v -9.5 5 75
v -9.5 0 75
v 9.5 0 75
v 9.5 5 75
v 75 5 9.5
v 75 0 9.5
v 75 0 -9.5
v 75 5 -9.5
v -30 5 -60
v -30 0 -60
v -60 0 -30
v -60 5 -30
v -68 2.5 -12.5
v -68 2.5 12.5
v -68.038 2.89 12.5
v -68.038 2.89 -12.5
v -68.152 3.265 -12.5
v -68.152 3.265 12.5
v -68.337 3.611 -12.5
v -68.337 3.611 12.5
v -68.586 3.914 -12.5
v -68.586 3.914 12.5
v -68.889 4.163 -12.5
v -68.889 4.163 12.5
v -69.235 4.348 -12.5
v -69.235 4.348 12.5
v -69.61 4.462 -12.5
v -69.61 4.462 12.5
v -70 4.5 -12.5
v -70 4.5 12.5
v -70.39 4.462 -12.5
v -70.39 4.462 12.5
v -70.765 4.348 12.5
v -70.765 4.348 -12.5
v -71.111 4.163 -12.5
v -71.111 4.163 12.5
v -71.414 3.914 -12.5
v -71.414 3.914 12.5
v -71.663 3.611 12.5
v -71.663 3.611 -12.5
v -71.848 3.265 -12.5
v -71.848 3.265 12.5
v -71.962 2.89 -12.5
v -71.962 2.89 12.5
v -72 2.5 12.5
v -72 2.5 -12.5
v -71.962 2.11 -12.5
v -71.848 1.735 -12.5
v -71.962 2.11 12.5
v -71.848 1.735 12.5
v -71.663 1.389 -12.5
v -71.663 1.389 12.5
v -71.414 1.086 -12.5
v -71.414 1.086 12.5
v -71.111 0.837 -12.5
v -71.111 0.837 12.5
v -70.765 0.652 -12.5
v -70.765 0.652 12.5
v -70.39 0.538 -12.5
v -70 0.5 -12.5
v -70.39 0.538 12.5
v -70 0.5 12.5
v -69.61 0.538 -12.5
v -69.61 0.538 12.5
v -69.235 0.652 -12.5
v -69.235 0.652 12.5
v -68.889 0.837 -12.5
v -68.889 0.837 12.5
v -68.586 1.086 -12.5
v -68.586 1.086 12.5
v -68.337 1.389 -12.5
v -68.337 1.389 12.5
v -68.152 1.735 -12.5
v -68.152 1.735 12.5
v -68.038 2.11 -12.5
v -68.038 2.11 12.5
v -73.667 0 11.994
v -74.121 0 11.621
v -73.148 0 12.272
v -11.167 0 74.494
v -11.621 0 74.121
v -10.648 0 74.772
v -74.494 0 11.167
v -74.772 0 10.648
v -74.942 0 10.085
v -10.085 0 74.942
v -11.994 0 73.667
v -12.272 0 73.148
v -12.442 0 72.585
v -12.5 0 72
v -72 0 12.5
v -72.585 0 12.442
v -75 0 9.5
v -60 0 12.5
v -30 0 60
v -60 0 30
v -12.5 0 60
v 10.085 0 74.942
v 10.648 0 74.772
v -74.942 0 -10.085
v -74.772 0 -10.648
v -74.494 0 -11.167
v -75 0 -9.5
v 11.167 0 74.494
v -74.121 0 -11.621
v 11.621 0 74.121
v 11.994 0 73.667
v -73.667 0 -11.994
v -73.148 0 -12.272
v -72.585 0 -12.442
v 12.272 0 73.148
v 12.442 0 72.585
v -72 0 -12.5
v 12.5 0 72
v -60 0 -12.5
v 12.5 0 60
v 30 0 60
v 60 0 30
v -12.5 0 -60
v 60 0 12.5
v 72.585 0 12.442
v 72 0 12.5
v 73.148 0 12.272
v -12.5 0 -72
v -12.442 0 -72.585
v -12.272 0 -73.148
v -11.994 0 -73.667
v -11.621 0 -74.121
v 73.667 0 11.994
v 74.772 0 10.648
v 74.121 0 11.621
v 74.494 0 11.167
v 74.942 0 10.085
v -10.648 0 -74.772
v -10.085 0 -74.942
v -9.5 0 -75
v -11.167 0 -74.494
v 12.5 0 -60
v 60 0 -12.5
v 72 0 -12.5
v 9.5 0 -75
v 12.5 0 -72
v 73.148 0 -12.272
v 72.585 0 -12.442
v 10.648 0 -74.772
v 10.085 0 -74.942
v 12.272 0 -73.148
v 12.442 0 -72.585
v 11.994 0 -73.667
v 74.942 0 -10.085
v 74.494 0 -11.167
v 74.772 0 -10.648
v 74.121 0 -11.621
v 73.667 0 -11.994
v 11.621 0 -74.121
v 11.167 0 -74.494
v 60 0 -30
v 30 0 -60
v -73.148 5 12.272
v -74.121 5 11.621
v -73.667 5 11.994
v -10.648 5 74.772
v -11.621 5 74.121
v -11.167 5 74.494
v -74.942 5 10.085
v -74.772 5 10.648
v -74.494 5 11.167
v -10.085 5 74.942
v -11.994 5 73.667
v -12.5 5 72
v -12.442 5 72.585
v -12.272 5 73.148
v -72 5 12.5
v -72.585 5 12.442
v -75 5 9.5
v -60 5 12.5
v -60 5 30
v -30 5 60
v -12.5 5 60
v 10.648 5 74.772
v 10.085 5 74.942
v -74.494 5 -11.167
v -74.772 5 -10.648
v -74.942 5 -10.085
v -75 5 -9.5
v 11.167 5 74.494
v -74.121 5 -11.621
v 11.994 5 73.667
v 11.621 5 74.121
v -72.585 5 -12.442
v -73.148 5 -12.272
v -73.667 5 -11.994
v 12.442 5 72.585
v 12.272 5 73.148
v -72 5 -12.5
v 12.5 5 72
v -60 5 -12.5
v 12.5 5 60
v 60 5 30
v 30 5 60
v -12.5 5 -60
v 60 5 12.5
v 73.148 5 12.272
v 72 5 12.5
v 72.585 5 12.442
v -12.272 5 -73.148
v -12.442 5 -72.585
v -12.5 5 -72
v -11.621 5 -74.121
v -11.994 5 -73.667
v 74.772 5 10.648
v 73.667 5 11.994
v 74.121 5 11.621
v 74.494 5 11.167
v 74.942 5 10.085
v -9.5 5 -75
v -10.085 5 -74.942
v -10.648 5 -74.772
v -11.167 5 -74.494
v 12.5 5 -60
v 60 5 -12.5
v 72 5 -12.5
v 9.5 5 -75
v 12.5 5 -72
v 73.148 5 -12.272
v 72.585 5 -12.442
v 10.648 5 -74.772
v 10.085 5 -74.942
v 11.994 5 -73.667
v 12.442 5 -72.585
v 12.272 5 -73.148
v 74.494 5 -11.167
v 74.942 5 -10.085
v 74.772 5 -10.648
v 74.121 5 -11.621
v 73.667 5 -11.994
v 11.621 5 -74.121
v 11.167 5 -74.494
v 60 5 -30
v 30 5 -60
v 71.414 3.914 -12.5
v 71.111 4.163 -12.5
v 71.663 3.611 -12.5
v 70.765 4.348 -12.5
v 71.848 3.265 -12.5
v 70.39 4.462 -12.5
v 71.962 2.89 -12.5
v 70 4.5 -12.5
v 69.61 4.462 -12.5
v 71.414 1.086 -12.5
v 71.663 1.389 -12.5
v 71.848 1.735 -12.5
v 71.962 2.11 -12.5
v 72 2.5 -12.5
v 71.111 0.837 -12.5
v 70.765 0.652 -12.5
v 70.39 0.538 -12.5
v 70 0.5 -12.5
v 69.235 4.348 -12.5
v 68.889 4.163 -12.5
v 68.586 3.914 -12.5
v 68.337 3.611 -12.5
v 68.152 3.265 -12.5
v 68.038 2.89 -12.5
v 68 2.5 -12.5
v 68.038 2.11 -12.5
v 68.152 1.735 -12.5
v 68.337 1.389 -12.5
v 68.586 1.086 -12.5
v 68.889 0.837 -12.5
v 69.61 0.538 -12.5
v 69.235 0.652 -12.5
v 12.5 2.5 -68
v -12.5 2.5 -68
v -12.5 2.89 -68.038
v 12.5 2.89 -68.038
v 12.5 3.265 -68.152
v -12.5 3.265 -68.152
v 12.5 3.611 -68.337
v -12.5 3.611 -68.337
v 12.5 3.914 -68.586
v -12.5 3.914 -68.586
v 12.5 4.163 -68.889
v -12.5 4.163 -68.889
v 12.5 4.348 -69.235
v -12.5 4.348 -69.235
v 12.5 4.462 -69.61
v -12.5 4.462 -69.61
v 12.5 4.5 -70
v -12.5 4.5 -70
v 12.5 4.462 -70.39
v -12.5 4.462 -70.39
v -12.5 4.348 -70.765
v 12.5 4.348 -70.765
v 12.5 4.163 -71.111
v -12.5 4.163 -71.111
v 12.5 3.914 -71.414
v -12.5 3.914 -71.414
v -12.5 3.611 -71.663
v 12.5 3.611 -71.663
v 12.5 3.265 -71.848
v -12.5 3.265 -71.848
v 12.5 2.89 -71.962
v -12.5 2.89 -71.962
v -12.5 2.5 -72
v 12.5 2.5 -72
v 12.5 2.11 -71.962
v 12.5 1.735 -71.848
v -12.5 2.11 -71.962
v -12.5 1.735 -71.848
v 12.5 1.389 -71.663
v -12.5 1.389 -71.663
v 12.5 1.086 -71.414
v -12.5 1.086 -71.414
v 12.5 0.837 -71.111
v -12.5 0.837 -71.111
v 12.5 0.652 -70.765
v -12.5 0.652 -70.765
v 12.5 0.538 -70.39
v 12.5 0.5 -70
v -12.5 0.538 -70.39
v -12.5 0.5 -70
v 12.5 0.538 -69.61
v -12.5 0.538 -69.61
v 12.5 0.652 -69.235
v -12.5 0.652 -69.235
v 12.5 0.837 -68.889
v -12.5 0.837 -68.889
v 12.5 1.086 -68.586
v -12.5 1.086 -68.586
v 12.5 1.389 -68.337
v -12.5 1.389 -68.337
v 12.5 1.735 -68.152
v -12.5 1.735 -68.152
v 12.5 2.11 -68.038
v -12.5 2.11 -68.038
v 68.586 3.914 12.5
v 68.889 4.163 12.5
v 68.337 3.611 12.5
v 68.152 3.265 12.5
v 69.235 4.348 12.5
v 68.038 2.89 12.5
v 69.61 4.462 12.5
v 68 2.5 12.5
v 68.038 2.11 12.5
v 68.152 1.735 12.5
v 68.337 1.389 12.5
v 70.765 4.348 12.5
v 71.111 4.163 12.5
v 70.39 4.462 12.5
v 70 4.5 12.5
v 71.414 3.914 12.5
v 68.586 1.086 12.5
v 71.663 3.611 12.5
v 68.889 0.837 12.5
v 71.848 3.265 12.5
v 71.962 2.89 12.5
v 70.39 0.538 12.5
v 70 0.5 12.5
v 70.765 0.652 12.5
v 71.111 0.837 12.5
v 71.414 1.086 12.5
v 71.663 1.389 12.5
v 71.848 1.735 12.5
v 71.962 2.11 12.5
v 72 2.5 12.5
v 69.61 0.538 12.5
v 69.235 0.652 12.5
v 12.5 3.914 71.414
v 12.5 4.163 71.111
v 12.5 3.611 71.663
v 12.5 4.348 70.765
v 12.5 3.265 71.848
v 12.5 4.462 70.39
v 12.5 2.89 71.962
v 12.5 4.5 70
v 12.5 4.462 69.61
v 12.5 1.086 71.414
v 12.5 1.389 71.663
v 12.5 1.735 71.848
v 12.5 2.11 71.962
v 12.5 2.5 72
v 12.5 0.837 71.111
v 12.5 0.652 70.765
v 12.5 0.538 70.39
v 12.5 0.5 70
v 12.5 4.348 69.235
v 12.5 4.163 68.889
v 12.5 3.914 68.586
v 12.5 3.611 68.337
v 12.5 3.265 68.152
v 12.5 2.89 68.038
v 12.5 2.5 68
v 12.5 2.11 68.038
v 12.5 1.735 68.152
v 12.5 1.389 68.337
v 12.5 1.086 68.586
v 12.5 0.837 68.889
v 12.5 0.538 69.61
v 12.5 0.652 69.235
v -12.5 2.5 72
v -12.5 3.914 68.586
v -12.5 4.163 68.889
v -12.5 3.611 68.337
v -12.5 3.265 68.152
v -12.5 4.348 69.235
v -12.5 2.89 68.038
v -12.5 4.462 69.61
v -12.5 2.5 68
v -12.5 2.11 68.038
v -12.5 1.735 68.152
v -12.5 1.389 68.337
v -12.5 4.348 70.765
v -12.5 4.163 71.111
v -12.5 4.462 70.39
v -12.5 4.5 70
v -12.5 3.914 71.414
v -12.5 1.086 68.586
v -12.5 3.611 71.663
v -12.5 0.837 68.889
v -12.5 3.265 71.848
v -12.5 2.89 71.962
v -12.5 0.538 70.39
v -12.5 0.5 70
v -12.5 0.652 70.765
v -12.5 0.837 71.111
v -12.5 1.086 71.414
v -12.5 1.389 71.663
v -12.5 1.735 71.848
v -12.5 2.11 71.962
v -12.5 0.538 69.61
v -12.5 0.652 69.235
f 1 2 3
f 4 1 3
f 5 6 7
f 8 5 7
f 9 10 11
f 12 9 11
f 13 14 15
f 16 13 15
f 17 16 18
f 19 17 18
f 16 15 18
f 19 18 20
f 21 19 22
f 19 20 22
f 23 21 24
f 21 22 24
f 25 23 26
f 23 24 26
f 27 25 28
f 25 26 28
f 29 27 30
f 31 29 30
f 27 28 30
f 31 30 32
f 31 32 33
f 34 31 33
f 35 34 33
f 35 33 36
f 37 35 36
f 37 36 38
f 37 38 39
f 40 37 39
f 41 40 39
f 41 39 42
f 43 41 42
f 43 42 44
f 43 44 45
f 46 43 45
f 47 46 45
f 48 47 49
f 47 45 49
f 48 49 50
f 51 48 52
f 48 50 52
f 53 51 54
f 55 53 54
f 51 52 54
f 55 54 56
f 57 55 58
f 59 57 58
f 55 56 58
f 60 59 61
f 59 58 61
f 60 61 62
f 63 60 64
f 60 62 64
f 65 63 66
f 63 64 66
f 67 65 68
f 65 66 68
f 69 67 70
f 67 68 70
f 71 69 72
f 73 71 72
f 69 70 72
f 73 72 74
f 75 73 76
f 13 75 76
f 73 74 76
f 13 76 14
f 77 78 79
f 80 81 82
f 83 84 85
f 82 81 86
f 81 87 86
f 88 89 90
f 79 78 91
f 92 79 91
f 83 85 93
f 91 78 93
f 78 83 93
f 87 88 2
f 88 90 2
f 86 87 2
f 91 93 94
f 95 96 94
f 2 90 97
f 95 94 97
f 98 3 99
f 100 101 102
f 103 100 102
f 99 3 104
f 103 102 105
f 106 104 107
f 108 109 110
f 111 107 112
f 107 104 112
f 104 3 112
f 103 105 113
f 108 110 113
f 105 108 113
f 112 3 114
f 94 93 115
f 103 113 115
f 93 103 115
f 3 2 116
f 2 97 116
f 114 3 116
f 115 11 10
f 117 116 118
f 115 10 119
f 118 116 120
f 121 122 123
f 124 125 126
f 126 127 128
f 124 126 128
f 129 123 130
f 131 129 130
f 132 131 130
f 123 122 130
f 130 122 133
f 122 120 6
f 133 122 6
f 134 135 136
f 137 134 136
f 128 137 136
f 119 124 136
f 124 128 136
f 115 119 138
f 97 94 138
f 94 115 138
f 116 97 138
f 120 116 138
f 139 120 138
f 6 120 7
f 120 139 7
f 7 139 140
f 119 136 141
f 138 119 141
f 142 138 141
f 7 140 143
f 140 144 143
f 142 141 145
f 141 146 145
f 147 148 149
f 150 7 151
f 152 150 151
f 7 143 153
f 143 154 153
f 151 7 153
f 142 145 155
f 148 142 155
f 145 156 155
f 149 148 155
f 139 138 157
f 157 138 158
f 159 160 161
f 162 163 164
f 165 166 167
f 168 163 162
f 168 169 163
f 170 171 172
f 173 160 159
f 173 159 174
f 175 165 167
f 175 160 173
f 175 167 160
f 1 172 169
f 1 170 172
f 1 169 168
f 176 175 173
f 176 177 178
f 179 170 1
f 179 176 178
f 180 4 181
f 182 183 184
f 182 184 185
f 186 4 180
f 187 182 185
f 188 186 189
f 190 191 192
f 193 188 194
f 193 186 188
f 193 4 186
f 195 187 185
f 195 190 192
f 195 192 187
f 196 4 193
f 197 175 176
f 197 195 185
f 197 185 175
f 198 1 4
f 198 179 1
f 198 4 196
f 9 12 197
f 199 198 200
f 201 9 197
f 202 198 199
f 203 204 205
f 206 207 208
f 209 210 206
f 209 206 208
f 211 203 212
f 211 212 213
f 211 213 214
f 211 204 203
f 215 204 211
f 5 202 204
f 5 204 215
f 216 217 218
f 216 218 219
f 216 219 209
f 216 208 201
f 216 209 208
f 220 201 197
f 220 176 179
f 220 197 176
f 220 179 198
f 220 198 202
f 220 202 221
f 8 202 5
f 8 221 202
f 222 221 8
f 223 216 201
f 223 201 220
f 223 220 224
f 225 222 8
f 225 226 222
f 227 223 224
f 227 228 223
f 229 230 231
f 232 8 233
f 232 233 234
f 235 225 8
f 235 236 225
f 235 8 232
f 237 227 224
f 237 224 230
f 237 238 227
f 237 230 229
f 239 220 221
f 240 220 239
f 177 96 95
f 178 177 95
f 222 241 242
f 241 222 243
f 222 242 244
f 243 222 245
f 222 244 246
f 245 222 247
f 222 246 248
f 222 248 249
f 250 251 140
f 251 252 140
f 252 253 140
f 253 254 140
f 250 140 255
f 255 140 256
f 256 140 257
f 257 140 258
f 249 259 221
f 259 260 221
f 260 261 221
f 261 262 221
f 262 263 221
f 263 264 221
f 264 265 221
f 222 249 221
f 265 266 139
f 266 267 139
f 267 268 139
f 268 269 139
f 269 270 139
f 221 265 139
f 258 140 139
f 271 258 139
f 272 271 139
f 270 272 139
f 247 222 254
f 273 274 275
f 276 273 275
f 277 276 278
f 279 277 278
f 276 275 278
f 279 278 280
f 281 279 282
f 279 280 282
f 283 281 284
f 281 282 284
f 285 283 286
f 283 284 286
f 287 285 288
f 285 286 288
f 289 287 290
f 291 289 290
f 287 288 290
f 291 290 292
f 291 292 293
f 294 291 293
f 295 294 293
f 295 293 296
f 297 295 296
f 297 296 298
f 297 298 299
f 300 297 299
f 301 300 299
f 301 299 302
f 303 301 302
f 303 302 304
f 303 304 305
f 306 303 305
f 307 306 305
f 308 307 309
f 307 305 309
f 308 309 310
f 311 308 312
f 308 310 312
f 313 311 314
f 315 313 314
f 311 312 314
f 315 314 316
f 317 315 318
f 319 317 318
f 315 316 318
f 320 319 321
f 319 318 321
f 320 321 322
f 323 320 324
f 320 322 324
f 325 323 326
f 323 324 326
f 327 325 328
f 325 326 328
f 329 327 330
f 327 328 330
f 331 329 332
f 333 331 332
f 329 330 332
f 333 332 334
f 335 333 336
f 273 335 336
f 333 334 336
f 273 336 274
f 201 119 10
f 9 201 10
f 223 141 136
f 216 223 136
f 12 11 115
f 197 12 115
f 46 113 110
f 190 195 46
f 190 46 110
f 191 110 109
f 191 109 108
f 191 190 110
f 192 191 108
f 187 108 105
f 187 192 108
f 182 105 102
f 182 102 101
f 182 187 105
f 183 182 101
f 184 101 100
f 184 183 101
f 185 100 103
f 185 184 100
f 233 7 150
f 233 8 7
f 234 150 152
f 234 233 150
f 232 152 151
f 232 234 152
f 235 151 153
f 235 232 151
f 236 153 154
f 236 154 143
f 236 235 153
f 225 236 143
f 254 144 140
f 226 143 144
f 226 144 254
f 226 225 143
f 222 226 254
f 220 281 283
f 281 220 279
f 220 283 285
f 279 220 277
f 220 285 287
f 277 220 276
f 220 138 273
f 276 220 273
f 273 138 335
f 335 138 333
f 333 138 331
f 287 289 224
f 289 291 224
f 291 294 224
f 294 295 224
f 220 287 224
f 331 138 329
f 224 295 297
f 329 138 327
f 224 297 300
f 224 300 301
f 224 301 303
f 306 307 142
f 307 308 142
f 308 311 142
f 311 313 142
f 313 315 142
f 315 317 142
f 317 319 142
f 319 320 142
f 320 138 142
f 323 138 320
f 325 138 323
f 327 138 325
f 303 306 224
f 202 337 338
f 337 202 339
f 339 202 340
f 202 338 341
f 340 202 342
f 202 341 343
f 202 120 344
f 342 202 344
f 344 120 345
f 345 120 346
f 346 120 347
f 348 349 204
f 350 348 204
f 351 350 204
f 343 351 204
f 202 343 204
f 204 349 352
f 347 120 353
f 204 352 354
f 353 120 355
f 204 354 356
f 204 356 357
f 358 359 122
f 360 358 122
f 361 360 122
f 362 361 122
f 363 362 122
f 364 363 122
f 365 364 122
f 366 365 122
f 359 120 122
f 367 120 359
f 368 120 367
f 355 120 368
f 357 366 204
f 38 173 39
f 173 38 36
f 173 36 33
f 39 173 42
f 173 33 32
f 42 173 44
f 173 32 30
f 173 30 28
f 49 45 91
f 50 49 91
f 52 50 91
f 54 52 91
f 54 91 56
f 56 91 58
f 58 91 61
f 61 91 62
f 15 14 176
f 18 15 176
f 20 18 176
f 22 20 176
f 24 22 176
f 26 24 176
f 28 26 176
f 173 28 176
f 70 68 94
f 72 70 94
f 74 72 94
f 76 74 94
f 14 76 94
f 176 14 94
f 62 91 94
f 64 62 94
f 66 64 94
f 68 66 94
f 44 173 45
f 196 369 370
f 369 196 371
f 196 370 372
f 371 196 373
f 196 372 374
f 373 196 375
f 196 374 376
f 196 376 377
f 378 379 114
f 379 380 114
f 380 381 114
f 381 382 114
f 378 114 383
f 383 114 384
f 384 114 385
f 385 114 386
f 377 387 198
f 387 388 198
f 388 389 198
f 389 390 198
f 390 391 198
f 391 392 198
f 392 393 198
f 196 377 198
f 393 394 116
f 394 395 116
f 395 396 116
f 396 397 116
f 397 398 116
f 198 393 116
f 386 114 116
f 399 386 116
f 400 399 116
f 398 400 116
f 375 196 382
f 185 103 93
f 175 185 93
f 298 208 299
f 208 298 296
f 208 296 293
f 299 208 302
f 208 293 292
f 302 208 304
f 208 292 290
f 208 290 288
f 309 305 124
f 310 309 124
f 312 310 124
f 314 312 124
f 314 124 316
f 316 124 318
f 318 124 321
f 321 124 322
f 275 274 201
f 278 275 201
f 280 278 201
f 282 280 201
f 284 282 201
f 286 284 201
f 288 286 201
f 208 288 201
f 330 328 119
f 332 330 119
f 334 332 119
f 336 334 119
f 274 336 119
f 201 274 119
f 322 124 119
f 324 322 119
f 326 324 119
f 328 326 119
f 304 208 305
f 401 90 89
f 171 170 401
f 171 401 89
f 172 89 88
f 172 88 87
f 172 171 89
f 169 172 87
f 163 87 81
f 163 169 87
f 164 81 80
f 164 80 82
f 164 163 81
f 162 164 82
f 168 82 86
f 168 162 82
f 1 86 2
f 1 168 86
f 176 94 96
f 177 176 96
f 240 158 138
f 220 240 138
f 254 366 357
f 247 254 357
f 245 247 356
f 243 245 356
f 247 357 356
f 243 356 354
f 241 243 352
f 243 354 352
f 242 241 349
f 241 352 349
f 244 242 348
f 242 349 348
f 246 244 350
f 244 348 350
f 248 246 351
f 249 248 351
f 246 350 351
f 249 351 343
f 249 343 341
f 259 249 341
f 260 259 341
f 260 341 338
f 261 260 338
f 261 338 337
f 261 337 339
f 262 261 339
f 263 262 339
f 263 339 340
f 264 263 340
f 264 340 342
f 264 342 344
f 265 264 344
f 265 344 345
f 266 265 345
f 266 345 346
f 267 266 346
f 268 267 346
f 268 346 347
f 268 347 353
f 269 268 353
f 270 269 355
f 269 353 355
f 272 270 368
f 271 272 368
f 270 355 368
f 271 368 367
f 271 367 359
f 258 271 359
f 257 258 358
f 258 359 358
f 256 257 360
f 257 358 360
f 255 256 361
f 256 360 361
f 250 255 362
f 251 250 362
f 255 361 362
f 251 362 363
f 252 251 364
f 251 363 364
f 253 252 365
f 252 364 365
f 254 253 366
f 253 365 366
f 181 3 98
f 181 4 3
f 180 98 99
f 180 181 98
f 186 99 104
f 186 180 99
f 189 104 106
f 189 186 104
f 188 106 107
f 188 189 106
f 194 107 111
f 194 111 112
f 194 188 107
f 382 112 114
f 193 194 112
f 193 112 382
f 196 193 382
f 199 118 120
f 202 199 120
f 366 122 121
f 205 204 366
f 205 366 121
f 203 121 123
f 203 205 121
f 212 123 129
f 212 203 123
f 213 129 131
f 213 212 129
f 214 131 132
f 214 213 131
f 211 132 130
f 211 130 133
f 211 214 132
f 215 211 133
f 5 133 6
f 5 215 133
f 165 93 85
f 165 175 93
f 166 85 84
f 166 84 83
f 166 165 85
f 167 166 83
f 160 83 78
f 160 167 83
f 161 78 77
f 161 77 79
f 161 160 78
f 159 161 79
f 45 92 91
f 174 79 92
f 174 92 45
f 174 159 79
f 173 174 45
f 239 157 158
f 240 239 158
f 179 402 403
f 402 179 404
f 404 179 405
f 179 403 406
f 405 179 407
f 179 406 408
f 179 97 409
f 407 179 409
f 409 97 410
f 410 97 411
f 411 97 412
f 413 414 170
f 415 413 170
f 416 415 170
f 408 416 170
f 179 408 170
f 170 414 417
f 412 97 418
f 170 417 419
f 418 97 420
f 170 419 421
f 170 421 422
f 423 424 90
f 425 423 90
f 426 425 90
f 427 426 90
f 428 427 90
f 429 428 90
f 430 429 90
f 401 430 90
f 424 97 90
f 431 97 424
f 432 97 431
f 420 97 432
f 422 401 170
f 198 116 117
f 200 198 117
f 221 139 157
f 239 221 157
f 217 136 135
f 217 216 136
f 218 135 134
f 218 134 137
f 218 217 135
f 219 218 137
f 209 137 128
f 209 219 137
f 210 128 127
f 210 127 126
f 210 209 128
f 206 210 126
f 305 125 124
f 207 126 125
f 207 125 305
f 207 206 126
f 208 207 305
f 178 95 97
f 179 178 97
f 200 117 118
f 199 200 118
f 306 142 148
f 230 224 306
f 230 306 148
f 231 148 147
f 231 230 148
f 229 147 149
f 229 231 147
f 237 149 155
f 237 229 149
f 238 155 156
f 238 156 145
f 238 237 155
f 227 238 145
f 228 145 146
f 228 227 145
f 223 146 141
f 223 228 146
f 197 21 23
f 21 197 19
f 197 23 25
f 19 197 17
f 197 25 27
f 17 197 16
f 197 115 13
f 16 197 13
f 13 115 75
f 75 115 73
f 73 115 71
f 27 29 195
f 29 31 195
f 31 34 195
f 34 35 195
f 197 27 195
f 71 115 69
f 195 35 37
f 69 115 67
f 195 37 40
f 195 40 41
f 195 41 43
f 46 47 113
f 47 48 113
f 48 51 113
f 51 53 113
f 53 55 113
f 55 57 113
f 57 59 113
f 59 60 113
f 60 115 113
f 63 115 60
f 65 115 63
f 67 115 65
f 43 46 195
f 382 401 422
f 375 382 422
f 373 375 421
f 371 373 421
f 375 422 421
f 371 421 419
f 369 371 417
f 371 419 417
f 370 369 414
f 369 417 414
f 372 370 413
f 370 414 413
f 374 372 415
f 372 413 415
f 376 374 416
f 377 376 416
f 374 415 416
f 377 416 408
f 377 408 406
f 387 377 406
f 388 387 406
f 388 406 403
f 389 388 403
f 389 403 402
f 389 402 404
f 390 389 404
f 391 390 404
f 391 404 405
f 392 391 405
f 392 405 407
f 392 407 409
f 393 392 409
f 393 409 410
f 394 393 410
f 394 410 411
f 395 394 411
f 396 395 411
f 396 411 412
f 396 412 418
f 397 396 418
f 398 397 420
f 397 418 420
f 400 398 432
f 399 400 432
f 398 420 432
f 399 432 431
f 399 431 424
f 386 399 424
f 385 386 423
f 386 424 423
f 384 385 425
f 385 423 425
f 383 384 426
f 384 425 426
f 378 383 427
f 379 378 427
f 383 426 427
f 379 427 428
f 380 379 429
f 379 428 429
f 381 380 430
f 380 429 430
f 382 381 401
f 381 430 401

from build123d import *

# Parameters (mm, degrees)
EXTRUDE_1_DEPTH     = 5
FILLET_1_R          = 3
SKETCH_11_R         = 2
CUT_EXTRUDE_6_DEPTH = 88.5
SKETCH_12_R         = 2
CUT_EXTRUDE_7_DEPTH = 88.5


with BuildPart() as part:
    # 스케치1 → 보스-돌출1 (new body)
    with BuildSketch(Plane(origin=(0, 0, 0), x_dir=(1, 0, 0), z_dir=(0, 1, 0))):
        Polygon((-60, -30), (-30, -60), (-12.5, -60), (-12.5, -75), (12.5, -75), (12.5, -60), (30, -60), (60, -30), (60, -12.5), (75, -12.5), (75, 12.5), (60, 12.5), (60, 30), (30, 60), (12.5, 60), (12.5, 75), (-12.5, 75), (-12.5, 60), (-30, 60), (-60, 30), (-60, 12.5), (-75, 12.5), (-75, -12.5), (-60, -12.5), align=None)
    extrude(amount=EXTRUDE_1_DEPTH)

    # 필렛1
    fillet_1_edges = [part.edges().sort_by_distance(p)[0] for p in [
        (-12.5, 2.5, -75),
        (12.5, 2.5, -75),
        (75, 2.5, -12.5),
        (75, 2.5, 12.5),
        (12.5, 2.5, 75),
        (-12.5, 2.5, 75),
        (-75, 2.5, 12.5),
        (-75, 2.5, -12.5),
    ]]
    fillet(fillet_1_edges, radius=FILLET_1_R)

    # 스케치11 → 컷-돌출6 (cut, through all)
    with BuildSketch(Plane.XY.offset(12.5)):
        with Locations((-70, 2.5)):
            Circle(SKETCH_11_R)
        with Locations((70, 2.5)):
            Circle(SKETCH_11_R)
    extrude(amount=-CUT_EXTRUDE_6_DEPTH, mode=Mode.SUBTRACT)

    # 스케치12 → 컷-돌출7 (cut, through all)
    with BuildSketch(Plane.ZY.offset(12.5)):
        with Locations((-70, 2.5)):
            Circle(SKETCH_12_R)
        with Locations((70, 2.5)):
            Circle(SKETCH_12_R)
    extrude(amount=-CUT_EXTRUDE_7_DEPTH, mode=Mode.SUBTRACT)


solid = part.part
